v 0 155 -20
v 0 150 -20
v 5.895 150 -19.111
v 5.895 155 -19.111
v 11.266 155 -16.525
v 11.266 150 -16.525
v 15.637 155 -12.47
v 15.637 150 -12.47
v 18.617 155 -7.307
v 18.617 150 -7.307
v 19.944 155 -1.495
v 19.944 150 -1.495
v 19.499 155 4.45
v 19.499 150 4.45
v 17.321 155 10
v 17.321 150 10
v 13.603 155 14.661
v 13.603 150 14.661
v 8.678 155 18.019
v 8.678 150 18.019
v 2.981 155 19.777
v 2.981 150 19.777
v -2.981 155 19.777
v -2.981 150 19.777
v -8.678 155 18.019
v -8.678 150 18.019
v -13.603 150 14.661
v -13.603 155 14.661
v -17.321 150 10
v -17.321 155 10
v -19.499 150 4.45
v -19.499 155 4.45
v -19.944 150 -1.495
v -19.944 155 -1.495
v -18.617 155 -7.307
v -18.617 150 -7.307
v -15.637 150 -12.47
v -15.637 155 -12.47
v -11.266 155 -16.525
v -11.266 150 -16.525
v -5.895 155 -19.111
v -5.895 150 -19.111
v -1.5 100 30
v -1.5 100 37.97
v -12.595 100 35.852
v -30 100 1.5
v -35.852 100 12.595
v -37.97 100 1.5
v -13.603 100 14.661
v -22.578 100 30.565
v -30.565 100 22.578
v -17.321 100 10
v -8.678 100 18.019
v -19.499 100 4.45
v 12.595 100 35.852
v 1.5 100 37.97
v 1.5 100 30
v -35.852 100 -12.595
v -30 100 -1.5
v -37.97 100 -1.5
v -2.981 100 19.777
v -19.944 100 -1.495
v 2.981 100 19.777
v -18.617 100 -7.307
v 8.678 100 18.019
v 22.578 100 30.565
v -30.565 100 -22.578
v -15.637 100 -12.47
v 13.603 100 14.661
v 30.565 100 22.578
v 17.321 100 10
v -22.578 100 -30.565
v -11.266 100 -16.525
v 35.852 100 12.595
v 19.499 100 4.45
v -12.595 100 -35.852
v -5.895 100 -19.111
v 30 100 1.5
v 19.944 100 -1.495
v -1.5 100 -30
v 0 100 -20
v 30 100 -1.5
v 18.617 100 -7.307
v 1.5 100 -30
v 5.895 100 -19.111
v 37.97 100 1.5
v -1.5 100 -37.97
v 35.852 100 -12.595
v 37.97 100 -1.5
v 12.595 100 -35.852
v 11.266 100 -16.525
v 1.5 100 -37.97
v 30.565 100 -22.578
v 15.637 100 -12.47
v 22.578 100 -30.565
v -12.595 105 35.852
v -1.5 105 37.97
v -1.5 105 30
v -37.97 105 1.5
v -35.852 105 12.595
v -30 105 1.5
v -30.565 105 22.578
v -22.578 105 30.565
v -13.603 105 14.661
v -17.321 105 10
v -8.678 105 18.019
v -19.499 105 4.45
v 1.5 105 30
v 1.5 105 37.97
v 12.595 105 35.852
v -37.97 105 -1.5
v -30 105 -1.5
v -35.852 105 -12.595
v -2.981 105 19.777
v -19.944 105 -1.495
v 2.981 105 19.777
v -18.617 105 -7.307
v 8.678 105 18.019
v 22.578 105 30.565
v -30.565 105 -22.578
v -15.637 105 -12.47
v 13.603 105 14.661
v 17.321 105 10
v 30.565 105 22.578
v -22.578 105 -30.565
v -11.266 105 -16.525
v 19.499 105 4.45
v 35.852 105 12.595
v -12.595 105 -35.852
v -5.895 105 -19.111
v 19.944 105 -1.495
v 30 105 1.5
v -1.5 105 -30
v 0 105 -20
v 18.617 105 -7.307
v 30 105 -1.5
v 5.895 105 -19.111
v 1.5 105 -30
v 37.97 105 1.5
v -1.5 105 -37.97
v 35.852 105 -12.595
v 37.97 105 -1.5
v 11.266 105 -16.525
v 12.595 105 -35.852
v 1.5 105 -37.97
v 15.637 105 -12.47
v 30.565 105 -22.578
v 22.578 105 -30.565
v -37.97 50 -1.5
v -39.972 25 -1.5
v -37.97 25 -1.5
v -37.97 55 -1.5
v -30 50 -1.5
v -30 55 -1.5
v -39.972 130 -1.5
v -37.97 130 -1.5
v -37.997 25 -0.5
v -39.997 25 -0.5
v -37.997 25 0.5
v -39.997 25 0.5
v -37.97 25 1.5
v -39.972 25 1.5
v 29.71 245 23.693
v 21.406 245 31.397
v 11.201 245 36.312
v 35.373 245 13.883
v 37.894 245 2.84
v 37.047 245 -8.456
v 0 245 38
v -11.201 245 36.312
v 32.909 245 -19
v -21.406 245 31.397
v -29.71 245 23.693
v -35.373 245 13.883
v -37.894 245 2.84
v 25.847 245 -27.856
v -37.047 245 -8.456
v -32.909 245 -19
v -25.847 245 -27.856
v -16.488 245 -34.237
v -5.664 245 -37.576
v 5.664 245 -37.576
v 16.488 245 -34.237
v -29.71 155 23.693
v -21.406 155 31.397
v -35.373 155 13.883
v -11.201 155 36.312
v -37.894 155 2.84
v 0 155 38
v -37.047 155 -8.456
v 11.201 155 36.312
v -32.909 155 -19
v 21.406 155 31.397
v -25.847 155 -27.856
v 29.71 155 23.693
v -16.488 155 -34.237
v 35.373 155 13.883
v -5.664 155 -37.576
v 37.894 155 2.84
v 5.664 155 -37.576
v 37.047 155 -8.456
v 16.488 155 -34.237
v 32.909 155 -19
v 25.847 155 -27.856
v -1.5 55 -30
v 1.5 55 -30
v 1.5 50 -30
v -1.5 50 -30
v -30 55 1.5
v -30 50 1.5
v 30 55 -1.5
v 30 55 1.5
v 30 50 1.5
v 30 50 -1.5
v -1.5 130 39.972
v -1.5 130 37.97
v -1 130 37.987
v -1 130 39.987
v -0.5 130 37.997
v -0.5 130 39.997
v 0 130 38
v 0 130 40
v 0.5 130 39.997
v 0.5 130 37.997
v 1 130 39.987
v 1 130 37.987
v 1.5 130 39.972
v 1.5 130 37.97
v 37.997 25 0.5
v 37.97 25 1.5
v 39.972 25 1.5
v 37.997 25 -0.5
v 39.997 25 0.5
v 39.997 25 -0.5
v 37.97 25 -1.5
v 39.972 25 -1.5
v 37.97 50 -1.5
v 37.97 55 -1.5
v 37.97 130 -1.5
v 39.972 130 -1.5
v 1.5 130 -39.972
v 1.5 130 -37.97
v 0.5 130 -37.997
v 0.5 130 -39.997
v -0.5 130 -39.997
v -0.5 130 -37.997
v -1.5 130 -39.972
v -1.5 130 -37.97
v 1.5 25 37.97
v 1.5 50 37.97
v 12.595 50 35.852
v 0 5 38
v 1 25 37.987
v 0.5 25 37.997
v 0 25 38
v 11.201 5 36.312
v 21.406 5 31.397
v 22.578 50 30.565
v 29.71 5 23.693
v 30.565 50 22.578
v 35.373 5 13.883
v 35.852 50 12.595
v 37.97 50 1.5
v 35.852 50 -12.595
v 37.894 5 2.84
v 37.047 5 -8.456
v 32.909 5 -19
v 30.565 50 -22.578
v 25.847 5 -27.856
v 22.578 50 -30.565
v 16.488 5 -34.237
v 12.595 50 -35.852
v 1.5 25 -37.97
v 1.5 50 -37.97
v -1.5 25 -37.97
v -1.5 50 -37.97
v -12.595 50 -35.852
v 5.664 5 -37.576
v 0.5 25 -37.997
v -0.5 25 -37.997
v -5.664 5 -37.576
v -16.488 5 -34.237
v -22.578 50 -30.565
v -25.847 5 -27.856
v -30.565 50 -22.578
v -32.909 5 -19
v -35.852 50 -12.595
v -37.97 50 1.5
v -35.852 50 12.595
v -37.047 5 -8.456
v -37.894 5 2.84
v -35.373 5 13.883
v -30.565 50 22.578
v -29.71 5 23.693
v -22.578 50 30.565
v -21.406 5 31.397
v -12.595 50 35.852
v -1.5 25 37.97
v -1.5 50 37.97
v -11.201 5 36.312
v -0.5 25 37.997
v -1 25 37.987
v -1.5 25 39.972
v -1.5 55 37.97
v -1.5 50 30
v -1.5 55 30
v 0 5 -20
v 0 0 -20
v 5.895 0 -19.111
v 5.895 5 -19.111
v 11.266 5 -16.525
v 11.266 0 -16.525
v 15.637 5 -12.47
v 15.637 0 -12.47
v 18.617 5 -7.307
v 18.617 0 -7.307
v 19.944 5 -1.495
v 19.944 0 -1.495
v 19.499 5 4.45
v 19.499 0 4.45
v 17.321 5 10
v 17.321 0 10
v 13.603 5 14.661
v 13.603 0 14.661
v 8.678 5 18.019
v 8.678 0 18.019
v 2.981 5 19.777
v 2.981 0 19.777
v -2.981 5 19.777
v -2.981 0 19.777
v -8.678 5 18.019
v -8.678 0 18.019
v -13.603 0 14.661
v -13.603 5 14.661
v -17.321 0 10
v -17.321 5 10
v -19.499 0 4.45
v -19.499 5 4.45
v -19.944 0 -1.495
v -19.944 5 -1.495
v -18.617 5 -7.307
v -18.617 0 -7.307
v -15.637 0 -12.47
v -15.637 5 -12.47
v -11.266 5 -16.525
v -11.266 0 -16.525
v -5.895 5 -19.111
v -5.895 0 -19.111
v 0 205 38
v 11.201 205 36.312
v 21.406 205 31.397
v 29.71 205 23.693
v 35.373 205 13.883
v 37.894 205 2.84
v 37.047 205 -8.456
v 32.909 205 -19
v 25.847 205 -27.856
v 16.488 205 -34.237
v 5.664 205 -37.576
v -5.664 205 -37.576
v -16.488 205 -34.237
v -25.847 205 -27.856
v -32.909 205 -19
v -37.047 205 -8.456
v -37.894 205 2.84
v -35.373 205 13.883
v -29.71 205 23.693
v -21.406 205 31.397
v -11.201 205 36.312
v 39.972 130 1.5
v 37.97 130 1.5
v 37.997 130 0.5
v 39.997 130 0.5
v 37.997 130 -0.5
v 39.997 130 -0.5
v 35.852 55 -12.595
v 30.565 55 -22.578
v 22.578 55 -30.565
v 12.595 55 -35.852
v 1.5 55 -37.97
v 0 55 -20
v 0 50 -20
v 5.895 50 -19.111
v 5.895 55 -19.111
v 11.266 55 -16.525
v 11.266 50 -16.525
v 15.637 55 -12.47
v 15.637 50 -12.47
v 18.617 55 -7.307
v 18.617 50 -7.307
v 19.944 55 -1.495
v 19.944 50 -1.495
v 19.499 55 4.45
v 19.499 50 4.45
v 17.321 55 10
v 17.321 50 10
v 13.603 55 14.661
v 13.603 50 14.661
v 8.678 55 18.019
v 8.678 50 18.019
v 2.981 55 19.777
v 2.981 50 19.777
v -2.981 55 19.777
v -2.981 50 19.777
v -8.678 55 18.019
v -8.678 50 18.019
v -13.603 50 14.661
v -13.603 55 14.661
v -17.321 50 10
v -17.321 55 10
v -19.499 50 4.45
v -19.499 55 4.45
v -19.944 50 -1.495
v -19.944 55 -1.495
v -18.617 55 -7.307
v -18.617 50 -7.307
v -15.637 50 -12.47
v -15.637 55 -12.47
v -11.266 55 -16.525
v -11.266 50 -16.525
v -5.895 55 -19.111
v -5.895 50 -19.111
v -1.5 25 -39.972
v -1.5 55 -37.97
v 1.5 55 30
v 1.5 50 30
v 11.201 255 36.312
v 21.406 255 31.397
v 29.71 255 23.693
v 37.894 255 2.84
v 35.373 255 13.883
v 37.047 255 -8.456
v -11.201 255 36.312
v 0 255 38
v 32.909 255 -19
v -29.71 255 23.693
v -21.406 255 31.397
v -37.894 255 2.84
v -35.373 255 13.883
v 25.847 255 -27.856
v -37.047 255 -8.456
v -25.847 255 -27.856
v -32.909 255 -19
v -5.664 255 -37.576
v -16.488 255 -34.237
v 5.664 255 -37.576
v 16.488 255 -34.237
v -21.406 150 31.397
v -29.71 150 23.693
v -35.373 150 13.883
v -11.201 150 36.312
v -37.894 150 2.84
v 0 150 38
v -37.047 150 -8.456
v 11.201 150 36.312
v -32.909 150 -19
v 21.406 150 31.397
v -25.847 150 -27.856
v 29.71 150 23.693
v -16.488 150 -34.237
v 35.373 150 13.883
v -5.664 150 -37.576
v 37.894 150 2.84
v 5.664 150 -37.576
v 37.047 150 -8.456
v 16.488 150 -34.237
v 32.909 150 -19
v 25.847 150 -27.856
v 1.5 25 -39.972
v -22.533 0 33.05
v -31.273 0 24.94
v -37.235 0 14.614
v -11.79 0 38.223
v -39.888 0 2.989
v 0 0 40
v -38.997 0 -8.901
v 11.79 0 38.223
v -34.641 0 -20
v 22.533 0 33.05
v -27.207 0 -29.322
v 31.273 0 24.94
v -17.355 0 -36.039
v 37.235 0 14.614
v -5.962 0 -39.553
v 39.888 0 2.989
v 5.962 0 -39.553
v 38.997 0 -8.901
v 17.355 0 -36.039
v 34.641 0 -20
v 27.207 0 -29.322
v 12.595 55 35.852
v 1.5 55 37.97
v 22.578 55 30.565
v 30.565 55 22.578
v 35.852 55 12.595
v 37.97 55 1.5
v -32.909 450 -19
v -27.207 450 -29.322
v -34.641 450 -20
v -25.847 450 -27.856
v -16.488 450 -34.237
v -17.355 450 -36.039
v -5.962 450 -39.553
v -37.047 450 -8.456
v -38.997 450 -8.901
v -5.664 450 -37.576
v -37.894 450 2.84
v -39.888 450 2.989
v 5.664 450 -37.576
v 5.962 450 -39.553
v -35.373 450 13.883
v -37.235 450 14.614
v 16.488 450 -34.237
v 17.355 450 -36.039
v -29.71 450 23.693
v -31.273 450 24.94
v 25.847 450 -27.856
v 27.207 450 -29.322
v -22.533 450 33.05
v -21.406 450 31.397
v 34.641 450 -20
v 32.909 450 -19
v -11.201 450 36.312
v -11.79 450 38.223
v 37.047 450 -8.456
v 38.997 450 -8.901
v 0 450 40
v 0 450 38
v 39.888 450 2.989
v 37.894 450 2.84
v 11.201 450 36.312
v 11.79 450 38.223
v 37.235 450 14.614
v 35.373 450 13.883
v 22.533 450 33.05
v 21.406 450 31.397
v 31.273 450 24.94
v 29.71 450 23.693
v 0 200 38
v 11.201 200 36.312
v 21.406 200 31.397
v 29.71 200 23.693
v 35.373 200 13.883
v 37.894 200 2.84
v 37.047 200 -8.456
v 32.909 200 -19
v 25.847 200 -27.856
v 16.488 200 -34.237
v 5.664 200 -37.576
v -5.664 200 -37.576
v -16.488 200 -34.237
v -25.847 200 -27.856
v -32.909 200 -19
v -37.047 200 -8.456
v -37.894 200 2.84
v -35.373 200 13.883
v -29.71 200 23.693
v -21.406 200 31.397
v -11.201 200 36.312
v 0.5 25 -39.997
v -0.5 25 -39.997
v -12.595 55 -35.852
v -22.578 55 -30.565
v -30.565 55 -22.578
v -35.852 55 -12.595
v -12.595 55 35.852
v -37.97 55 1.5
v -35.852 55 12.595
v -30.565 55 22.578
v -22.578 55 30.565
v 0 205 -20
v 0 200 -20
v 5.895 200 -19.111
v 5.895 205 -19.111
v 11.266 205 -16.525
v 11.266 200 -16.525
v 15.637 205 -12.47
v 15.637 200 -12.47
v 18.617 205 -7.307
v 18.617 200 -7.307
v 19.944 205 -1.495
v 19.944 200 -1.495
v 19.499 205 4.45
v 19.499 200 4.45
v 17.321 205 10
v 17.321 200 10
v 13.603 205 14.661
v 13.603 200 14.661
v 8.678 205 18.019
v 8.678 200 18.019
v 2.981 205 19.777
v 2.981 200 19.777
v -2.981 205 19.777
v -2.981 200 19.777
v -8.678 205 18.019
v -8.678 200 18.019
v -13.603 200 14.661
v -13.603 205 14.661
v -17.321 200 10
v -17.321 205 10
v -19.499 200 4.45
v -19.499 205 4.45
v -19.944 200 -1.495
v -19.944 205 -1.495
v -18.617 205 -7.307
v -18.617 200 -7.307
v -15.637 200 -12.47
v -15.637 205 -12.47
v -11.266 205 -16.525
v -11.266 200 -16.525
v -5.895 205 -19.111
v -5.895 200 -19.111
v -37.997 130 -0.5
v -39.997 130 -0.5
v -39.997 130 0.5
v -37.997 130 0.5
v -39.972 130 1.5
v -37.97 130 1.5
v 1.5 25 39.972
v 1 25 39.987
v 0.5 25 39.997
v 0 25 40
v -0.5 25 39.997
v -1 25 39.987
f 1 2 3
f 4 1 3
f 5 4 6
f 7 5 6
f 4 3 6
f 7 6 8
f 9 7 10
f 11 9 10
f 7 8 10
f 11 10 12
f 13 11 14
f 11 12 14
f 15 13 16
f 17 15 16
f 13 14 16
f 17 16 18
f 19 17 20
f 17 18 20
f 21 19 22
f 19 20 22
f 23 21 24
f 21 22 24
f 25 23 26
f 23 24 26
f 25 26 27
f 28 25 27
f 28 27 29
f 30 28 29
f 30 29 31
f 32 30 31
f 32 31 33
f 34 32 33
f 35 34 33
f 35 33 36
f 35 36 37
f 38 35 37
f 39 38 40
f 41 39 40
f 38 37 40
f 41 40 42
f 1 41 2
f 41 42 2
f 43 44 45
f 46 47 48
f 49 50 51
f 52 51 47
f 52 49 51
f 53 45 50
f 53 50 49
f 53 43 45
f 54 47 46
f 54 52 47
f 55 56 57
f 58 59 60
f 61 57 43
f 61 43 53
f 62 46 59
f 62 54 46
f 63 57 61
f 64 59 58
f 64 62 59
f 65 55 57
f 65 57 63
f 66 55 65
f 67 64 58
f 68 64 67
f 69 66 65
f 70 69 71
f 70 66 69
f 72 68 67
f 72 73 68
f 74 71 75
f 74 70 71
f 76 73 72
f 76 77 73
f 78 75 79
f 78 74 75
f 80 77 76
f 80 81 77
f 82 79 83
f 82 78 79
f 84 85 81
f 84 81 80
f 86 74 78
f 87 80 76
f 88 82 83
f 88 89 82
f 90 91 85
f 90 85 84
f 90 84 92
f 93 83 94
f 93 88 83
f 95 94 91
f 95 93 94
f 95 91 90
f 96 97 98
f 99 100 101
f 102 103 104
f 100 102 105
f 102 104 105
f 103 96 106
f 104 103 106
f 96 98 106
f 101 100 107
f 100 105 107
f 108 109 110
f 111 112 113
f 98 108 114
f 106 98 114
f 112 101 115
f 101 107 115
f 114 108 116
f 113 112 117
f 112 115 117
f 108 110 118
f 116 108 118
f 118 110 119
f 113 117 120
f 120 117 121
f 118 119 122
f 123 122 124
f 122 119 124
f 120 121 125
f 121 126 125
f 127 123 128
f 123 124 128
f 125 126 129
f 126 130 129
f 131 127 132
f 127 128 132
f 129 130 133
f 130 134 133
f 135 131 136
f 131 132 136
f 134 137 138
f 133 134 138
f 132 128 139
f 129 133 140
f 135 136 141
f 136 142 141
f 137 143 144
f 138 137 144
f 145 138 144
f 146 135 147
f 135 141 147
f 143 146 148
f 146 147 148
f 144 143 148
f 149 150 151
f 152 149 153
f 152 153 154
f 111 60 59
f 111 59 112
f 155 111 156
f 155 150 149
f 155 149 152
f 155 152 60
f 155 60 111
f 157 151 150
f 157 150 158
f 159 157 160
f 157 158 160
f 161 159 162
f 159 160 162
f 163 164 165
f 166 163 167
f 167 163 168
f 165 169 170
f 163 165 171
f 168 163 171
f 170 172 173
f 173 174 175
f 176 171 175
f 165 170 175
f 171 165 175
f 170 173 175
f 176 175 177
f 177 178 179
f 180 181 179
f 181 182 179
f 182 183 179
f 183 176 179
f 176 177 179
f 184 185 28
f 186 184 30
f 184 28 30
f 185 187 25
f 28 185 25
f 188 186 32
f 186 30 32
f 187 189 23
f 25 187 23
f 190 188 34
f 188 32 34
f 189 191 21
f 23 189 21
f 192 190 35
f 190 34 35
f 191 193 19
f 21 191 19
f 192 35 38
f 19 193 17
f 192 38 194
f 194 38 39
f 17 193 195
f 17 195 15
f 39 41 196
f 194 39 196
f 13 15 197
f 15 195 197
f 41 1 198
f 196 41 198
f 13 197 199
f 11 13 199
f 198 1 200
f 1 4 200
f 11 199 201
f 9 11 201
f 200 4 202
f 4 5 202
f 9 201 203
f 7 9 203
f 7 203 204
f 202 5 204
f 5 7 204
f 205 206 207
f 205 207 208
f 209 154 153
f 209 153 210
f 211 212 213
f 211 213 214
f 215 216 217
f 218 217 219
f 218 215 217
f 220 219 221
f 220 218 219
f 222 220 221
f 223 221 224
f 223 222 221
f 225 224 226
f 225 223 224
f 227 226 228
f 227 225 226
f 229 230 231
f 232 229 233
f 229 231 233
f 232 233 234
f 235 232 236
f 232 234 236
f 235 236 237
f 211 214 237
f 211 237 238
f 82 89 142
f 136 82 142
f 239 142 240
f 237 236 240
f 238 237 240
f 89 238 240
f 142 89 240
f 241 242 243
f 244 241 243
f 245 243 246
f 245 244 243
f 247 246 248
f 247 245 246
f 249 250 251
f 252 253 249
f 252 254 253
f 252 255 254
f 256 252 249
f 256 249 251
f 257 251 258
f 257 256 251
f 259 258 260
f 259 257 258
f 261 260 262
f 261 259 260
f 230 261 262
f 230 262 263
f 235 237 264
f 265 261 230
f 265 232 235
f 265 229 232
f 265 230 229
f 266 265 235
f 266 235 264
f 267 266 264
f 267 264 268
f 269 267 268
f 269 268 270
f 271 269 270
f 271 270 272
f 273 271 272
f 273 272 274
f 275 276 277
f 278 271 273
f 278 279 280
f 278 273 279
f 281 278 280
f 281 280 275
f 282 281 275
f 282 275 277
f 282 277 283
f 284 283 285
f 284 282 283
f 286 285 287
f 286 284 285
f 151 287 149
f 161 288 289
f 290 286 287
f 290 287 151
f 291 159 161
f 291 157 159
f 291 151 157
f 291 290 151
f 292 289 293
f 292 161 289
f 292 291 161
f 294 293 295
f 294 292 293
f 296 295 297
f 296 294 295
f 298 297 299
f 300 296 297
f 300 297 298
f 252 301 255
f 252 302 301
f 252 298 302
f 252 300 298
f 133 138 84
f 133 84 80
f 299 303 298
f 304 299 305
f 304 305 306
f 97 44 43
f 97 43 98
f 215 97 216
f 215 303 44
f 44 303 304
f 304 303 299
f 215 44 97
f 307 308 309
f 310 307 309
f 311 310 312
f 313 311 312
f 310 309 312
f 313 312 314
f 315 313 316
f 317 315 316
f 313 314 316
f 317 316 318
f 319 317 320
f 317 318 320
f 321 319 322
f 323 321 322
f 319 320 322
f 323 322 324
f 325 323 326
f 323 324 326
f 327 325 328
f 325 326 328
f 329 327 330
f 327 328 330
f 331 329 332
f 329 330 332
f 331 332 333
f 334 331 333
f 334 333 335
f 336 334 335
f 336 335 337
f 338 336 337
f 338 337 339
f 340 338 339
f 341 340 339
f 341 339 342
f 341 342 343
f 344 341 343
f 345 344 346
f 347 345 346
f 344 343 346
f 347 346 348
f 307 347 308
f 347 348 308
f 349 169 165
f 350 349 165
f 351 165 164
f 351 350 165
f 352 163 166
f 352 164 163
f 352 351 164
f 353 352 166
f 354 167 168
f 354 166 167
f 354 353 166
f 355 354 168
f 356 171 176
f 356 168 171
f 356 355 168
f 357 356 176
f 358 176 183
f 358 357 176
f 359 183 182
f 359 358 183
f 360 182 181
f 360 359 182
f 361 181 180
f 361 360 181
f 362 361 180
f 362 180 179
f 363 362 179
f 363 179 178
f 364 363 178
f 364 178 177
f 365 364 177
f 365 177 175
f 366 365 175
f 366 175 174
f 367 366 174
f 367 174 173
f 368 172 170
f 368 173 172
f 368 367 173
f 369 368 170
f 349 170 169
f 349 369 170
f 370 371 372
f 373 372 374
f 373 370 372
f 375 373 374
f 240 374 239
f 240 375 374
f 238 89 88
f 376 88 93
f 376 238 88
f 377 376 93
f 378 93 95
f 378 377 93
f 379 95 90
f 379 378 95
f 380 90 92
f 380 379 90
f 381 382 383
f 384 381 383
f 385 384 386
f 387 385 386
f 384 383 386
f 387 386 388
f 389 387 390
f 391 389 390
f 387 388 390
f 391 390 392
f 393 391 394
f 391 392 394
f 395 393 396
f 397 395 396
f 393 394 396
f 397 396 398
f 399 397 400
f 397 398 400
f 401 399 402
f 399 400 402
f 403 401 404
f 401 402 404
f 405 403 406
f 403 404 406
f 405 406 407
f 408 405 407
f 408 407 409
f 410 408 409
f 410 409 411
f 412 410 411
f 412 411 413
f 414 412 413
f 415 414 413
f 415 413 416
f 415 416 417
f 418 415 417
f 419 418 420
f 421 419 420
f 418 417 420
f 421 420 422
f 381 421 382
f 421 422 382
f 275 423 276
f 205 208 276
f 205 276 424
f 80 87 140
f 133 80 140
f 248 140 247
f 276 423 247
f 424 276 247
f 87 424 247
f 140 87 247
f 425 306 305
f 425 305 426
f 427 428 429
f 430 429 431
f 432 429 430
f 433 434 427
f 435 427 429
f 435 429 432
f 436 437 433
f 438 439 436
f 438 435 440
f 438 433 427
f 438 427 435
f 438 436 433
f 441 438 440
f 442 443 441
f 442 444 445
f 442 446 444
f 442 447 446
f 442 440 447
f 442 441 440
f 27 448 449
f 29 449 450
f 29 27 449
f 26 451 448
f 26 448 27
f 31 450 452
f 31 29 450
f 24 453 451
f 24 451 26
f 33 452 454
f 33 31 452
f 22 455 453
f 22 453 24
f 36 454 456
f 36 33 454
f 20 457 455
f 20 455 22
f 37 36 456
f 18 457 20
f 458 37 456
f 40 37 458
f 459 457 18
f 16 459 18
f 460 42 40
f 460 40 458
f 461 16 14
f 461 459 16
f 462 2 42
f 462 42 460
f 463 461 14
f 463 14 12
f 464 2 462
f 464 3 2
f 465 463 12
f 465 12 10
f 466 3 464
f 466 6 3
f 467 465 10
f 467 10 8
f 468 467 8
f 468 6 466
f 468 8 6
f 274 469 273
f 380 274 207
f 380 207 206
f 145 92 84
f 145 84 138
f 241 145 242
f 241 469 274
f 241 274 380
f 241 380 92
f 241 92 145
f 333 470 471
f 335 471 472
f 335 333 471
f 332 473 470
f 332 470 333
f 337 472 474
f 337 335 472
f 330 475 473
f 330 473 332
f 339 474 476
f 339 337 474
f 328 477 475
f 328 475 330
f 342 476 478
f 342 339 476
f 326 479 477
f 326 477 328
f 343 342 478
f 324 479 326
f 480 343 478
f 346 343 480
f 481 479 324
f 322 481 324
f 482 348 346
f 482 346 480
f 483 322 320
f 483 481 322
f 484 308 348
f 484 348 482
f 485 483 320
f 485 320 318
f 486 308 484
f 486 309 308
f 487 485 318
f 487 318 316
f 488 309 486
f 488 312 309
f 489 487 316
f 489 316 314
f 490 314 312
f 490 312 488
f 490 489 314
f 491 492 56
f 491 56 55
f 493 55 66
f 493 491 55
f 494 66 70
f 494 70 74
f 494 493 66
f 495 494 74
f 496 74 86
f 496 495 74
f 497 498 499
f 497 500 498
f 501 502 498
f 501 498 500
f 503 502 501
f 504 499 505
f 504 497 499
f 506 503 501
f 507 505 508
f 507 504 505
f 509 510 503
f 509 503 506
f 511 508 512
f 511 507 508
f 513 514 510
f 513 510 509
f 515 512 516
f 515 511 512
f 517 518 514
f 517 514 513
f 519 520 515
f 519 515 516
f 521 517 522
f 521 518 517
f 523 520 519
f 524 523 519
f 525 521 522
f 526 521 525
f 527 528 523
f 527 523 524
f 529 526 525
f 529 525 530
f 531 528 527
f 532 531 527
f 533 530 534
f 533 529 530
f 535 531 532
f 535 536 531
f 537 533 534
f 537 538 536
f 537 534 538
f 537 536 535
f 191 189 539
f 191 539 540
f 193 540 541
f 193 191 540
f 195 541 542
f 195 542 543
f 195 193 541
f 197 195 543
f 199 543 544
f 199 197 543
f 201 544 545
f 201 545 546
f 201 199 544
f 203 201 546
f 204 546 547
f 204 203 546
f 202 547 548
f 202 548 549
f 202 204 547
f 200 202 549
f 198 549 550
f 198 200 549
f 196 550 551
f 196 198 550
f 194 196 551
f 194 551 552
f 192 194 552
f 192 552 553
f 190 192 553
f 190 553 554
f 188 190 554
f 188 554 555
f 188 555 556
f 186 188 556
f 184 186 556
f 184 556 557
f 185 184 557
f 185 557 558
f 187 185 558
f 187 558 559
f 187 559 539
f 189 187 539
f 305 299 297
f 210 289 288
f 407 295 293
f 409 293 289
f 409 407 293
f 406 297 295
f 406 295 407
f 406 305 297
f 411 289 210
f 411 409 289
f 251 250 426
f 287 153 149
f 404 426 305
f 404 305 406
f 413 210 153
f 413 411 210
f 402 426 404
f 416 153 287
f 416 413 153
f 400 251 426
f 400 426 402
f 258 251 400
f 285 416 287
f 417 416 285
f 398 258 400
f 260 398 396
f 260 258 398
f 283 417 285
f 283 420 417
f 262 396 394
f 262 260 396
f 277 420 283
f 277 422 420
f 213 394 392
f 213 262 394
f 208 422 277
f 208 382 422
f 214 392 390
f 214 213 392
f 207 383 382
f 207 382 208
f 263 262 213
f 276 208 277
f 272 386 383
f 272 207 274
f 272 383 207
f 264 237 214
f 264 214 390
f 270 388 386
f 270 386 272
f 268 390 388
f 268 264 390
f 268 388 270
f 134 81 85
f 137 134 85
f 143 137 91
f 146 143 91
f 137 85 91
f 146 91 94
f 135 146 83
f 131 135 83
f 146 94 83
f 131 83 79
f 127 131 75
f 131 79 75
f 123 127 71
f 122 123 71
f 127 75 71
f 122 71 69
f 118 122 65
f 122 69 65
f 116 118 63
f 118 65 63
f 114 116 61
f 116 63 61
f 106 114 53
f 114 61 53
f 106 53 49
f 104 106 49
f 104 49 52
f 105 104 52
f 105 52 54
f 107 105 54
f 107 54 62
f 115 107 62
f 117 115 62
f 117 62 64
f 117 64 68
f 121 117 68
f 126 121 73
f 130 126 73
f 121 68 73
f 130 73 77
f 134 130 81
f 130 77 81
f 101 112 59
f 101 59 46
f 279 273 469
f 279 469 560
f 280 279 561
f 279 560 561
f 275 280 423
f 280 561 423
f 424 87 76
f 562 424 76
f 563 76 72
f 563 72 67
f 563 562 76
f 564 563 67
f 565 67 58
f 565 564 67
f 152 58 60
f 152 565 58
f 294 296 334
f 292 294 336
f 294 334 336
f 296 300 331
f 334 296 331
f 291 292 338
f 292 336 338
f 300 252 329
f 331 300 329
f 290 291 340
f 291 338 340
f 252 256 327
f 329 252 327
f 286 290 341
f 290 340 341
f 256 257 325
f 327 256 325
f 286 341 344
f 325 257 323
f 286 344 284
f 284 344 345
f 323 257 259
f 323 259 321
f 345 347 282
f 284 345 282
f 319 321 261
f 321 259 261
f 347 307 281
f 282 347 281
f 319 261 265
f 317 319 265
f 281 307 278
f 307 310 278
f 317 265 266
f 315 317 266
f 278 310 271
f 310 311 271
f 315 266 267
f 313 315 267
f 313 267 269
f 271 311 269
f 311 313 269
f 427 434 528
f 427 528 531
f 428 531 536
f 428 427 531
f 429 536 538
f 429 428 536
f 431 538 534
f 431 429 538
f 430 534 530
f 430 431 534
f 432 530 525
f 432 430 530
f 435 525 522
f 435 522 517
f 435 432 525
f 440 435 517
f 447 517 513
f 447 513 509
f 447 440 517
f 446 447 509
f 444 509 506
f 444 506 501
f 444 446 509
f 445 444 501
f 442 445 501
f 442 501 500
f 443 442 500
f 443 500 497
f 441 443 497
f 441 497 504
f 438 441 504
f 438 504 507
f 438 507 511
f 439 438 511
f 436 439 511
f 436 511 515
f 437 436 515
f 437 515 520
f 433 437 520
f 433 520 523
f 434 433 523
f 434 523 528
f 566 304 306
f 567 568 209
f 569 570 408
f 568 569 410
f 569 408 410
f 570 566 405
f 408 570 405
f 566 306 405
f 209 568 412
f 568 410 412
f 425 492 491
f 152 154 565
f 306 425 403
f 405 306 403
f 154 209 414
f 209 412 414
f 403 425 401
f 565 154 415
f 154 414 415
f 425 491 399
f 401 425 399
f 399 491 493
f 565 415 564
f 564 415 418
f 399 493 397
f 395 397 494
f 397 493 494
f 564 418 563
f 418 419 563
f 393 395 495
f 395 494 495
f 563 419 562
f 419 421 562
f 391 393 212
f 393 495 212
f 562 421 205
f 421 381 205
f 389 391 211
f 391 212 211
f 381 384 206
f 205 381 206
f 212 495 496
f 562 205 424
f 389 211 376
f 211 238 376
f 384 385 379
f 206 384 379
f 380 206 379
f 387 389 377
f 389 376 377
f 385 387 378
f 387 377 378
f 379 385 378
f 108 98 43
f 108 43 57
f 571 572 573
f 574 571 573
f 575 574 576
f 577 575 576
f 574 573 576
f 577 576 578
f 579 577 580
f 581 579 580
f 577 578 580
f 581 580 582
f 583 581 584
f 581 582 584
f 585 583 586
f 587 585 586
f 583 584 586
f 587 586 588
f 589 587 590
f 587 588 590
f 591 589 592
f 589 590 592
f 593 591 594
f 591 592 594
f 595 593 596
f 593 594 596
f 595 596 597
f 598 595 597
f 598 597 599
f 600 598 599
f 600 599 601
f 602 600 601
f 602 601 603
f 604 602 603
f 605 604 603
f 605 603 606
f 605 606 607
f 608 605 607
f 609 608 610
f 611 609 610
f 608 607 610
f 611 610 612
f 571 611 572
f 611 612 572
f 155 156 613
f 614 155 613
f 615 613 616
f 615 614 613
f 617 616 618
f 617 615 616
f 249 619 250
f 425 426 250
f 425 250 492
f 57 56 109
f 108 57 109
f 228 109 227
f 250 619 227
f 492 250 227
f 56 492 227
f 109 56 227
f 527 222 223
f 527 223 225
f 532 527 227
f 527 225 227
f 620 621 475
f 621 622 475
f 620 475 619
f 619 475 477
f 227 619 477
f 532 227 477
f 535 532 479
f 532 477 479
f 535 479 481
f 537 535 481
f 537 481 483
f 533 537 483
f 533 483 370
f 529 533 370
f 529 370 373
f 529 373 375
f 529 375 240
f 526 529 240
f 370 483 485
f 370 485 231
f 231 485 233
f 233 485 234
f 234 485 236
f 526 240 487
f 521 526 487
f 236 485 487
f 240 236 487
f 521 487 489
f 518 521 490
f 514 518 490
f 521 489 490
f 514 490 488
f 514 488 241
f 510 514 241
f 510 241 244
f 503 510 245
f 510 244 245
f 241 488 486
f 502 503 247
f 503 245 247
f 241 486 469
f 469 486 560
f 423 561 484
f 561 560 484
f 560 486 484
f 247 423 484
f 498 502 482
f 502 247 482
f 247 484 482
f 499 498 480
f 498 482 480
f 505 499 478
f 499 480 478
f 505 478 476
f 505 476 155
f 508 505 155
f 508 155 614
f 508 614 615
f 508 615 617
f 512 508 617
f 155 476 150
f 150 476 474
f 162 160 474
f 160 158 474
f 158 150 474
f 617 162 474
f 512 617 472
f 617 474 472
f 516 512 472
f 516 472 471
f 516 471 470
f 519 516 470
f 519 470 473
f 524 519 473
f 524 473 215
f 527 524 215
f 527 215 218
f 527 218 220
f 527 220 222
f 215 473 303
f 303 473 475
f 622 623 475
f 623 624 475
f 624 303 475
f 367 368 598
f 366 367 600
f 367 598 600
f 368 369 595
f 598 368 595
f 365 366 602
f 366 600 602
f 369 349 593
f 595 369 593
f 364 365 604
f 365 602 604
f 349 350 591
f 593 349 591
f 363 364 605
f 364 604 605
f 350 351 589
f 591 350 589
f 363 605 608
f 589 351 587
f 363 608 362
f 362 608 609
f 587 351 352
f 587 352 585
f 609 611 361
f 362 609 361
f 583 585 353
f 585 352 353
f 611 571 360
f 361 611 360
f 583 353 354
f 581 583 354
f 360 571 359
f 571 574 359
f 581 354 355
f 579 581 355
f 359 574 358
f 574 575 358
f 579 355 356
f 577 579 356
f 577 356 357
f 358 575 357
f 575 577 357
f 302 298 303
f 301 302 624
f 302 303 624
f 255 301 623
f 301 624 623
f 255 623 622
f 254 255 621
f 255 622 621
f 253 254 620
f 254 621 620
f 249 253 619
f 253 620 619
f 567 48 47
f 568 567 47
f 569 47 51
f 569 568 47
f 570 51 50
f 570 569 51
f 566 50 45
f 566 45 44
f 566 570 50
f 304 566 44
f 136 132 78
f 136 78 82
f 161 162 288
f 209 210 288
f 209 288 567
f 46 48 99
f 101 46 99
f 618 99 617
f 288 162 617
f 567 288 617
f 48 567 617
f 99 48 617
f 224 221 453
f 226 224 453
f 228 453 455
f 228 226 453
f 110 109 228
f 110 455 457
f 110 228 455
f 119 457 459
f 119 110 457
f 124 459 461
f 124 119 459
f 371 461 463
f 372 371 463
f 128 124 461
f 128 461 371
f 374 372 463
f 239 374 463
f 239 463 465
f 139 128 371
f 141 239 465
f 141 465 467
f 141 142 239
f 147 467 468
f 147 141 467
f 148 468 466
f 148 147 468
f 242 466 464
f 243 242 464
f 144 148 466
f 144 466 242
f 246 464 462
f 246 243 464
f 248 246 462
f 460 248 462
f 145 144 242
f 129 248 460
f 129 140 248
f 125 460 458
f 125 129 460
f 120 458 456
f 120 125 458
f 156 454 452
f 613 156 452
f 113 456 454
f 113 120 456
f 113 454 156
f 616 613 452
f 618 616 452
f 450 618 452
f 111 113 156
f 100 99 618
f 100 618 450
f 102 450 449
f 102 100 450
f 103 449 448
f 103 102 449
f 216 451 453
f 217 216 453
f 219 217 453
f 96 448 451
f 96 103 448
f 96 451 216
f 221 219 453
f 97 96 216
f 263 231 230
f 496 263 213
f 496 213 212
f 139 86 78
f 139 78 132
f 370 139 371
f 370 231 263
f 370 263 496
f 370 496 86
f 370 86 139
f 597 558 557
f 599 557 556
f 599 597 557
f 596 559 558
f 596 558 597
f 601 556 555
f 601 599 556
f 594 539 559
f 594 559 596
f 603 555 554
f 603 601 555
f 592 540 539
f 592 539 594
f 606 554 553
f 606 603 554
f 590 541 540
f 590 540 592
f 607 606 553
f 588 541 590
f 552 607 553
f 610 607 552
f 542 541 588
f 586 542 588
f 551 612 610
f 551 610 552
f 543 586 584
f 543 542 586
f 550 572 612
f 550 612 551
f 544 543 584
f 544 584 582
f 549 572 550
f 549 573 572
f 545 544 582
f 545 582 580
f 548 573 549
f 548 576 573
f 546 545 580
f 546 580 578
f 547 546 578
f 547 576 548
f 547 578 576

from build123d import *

# Parameters (mm, degrees)
SKETCH1_R           = 40
SKETCH1_R_2         = 38
BOSS_EXTRUDE1_DEPTH = 450
SKETCH3_R           = 38
SKETCH3_R_2         = 20
BOSS_EXTRUDE2_DEPTH = 5
LPATTERN1_COUNT     = 5
LPATTERN1_PITCH     = 50
BOSS_EXTRUDE3_START = -10
SKETCH6_R           = 38
BOSS_EXTRUDE3_DEPTH = 10
SKETCH2_W           = 3
SKETCH2_H           = 105
CUT_EXTRUDE6_DEPTH  = 10
CIRPATTERN6_COUNT   = 4


with BuildPart() as part:
    # Sketch1 → Boss-Extrude1 (new body)
    with BuildSketch(Plane(origin=(0, 0, 0), x_dir=(1, 0, 0), z_dir=(0, 1, 0))):
        with Locations(Location((0, 0, 0), (0, 0, 270))):
            Circle(SKETCH1_R)
        with Locations(Location((0, 0, 0), (0, 0, 270))):
            Circle(SKETCH1_R_2, mode=Mode.SUBTRACT)
    extrude(amount=BOSS_EXTRUDE1_DEPTH)

    # Sketch3 → Boss-Extrude2 (add)
    with BuildSketch(Plane.XZ):
        with Locations(Location((0, 0, 0), (0, 0, 270))):
            Circle(SKETCH3_R)
        with Locations(Location((0, 0, 0), (0, 0, 270))):
            Circle(SKETCH3_R_2, mode=Mode.SUBTRACT)
    boss_extrude2 = extrude(amount=-BOSS_EXTRUDE2_DEPTH)

    # LPattern1: Boss-Extrude2 ×5
    with Locations(*[(0, i * LPATTERN1_PITCH, 0) for i in range(1, LPATTERN1_COUNT)]):
        add(boss_extrude2)

    # Sketch6 → Boss-Extrude3 (add)
    with BuildSketch(Plane(origin=(0, 255, 0), x_dir=(1, 0, 0), z_dir=(0, 1, 0)).offset(BOSS_EXTRUDE3_START)):
        with Locations(Location((0, 0, 0), (0, 0, 90))):
            Circle(SKETCH6_R)
    extrude(amount=BOSS_EXTRUDE3_DEPTH)

    # Sketch2 → Cut-Extrude6 (cut)
    with BuildSketch(Plane.ZY.offset(40)):
        with Locations((0, 77.5)):
            Rectangle(SKETCH2_W, SKETCH2_H)
    cut_extrude6 = extrude(amount=-CUT_EXTRUDE6_DEPTH, mode=Mode.SUBTRACT)

    # CirPattern6: Cut-Extrude6 ×4 about axis
    cirpattern6_axis = Axis((0, 0, 0), (0, 1, 0))
    for i in range(1, CIRPATTERN6_COUNT):
        add(cut_extrude6.rotate(cirpattern6_axis, i * 360 / CIRPATTERN6_COUNT), mode=Mode.SUBTRACT)


solid = part.part
